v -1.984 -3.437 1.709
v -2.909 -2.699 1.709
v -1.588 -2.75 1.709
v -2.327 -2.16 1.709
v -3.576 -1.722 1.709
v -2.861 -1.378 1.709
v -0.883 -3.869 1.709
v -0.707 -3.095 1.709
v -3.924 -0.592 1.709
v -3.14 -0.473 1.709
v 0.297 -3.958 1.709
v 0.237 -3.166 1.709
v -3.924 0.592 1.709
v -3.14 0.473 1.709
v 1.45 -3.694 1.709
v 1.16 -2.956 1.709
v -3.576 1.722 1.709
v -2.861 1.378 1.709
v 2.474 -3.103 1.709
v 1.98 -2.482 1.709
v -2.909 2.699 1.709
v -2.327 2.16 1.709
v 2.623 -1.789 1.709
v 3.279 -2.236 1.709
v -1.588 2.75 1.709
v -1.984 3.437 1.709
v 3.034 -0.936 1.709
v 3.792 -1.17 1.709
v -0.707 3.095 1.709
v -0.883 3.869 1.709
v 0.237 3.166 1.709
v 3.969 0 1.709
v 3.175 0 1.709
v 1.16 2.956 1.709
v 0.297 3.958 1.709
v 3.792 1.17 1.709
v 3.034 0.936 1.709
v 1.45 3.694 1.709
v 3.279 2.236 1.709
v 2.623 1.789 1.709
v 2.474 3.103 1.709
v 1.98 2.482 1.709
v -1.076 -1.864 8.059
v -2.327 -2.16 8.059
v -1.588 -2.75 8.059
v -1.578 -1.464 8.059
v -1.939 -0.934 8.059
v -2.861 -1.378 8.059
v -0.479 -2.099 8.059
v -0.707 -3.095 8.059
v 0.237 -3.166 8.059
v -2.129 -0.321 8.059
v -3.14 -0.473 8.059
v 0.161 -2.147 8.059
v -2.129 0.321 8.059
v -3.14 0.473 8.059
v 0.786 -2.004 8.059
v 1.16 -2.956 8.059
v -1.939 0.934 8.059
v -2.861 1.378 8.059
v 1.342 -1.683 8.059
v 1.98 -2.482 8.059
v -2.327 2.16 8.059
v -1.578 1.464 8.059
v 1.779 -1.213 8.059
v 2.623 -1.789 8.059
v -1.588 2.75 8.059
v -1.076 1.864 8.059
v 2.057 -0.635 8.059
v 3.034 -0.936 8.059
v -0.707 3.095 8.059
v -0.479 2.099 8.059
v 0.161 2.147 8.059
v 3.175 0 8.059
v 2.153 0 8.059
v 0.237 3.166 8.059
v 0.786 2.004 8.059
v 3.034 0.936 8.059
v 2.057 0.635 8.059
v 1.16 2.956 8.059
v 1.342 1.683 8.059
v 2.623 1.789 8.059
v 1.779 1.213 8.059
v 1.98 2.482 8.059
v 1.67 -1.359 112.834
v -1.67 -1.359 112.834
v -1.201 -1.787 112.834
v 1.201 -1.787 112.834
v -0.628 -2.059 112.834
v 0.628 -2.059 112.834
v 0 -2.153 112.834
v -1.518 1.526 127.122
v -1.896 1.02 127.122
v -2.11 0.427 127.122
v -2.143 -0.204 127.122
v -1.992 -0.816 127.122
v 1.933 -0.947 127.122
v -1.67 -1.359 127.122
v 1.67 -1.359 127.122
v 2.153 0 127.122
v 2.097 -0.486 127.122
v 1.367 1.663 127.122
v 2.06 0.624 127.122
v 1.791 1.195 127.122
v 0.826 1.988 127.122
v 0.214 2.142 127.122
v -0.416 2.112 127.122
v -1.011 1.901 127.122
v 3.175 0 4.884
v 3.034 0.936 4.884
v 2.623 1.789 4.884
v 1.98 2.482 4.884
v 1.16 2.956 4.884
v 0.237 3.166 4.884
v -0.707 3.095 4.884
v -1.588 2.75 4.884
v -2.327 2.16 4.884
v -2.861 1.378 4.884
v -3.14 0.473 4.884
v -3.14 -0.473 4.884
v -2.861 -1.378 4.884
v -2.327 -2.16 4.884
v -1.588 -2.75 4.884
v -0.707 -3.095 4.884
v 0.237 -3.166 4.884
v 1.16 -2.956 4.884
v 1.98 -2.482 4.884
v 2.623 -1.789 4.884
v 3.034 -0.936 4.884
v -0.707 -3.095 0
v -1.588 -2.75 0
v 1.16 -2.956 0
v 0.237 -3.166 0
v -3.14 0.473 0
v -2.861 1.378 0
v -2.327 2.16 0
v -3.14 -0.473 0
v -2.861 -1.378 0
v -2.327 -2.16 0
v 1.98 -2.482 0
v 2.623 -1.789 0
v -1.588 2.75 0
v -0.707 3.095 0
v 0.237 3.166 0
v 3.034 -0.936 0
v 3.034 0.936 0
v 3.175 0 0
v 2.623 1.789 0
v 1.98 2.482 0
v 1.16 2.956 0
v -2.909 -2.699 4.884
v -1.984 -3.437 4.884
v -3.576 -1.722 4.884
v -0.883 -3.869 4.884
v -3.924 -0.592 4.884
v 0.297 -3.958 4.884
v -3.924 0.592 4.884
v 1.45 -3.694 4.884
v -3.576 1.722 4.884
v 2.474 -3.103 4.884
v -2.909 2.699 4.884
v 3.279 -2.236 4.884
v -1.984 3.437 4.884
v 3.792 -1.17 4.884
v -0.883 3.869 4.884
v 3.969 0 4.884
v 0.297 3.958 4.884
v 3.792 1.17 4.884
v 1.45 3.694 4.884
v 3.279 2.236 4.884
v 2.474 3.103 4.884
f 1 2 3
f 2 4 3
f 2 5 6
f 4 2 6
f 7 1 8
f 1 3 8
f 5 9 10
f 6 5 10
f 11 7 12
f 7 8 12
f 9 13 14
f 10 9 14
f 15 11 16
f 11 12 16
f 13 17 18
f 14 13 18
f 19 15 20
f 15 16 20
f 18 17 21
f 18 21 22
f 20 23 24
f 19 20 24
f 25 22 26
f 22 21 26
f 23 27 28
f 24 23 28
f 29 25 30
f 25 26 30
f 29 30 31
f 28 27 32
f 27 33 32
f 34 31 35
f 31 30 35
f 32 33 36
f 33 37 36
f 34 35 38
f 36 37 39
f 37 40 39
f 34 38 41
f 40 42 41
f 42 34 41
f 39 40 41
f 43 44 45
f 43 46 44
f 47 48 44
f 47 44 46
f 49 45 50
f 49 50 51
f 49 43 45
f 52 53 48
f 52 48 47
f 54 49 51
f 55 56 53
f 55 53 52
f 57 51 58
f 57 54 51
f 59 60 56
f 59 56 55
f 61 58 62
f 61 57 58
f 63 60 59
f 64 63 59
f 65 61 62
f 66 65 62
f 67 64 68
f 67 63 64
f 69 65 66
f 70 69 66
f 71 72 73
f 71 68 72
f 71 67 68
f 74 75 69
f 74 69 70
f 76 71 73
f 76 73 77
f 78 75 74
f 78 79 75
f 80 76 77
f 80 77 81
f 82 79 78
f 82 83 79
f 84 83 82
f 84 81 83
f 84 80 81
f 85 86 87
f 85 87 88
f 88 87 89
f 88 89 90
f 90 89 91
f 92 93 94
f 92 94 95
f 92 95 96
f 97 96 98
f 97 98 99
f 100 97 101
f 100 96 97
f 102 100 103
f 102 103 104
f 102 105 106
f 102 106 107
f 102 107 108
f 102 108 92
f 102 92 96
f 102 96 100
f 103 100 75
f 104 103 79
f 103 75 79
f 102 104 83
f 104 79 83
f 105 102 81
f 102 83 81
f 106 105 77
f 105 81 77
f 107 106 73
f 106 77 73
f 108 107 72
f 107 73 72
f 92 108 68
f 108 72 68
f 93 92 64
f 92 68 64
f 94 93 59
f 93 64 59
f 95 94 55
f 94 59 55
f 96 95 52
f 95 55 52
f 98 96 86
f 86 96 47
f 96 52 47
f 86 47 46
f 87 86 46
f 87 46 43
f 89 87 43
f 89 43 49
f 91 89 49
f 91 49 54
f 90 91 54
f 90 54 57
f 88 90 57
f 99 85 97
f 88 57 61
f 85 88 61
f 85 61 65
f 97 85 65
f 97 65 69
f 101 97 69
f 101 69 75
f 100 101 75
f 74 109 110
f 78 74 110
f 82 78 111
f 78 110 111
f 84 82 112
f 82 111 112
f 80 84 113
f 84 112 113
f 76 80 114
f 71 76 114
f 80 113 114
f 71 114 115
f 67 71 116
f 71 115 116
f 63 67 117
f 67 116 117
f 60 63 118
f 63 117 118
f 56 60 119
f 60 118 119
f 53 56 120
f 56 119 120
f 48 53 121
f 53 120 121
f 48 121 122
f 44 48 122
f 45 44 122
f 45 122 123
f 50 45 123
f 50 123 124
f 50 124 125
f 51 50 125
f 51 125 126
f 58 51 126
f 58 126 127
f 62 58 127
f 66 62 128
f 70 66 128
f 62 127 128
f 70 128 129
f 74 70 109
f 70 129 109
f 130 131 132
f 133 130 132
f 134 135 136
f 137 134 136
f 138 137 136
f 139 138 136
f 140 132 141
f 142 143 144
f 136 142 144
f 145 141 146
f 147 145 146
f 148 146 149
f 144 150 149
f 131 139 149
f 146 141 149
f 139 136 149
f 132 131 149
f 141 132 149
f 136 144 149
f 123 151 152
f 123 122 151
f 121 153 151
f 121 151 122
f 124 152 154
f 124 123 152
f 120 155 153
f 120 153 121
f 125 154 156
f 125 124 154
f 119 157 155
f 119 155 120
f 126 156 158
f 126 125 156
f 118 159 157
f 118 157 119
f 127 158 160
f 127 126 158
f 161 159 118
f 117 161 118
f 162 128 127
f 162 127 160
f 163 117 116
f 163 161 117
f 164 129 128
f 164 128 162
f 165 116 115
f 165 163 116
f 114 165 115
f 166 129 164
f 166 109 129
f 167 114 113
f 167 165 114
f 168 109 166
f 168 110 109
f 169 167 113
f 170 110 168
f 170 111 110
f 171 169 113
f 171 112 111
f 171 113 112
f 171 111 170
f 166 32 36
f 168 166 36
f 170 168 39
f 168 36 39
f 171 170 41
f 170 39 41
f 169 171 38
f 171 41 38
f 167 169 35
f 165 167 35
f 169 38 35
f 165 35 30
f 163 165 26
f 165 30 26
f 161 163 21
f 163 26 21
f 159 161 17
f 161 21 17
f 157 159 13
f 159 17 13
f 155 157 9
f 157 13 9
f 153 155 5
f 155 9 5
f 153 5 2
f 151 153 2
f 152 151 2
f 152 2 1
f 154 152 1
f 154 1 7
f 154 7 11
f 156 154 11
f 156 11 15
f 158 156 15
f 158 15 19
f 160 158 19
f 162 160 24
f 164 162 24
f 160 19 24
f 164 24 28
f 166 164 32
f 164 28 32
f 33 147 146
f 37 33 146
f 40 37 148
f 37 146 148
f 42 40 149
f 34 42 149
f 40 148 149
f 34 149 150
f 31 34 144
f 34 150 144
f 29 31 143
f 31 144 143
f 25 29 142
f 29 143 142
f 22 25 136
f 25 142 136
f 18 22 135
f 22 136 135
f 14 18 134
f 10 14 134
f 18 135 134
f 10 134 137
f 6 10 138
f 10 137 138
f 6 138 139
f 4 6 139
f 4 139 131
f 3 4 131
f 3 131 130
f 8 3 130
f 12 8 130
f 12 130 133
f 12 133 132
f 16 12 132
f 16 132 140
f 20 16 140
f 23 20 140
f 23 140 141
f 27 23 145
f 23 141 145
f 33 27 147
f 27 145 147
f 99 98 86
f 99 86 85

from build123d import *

# Parameters (mm, degrees)
F0_R     = 3.175
F1_DEPTH = 1.70942
F2_R     = 3.96875
F3_DEPTH = 3.175
F4_R     = 3.175
F5_DEPTH = 3.175
F6_R     = 2.15265
F7_DEPTH = 119.0625
F8_W     = 3.339038
F8_H     = 0.79375
F9_DEPTH = 14.2875


with BuildPart() as f1:
    # F0 (on Top) → F1 (new body)
    with BuildSketch(Plane.XY):
        Circle(F0_R)
    extrude(amount=F1_DEPTH)

    # F2 (on face) → F3 (join)
    with BuildSketch(Plane.XY.offset(1.70942)):
        Circle(F2_R)
    extrude(amount=F3_DEPTH)

    # F4 (on face) → F5 (join)
    with BuildSketch(Plane.XY.offset(4.88442)):
        Circle(F4_R)
    extrude(amount=F5_DEPTH)

    # F6 (on face) → F7 (join)
    with BuildSketch(Plane.XY.offset(8.05942)):
        Circle(F6_R)
    extrude(amount=F7_DEPTH)

    # F8 (on face) → F9 (cut)
    with BuildSketch(Plane.XY.offset(127.12192)):
        with Locations((0, -1.755775)):
            Rectangle(F8_W, F8_H)
    extrude(amount=-F9_DEPTH, mode=Mode.SUBTRACT)


solid = f1.part
